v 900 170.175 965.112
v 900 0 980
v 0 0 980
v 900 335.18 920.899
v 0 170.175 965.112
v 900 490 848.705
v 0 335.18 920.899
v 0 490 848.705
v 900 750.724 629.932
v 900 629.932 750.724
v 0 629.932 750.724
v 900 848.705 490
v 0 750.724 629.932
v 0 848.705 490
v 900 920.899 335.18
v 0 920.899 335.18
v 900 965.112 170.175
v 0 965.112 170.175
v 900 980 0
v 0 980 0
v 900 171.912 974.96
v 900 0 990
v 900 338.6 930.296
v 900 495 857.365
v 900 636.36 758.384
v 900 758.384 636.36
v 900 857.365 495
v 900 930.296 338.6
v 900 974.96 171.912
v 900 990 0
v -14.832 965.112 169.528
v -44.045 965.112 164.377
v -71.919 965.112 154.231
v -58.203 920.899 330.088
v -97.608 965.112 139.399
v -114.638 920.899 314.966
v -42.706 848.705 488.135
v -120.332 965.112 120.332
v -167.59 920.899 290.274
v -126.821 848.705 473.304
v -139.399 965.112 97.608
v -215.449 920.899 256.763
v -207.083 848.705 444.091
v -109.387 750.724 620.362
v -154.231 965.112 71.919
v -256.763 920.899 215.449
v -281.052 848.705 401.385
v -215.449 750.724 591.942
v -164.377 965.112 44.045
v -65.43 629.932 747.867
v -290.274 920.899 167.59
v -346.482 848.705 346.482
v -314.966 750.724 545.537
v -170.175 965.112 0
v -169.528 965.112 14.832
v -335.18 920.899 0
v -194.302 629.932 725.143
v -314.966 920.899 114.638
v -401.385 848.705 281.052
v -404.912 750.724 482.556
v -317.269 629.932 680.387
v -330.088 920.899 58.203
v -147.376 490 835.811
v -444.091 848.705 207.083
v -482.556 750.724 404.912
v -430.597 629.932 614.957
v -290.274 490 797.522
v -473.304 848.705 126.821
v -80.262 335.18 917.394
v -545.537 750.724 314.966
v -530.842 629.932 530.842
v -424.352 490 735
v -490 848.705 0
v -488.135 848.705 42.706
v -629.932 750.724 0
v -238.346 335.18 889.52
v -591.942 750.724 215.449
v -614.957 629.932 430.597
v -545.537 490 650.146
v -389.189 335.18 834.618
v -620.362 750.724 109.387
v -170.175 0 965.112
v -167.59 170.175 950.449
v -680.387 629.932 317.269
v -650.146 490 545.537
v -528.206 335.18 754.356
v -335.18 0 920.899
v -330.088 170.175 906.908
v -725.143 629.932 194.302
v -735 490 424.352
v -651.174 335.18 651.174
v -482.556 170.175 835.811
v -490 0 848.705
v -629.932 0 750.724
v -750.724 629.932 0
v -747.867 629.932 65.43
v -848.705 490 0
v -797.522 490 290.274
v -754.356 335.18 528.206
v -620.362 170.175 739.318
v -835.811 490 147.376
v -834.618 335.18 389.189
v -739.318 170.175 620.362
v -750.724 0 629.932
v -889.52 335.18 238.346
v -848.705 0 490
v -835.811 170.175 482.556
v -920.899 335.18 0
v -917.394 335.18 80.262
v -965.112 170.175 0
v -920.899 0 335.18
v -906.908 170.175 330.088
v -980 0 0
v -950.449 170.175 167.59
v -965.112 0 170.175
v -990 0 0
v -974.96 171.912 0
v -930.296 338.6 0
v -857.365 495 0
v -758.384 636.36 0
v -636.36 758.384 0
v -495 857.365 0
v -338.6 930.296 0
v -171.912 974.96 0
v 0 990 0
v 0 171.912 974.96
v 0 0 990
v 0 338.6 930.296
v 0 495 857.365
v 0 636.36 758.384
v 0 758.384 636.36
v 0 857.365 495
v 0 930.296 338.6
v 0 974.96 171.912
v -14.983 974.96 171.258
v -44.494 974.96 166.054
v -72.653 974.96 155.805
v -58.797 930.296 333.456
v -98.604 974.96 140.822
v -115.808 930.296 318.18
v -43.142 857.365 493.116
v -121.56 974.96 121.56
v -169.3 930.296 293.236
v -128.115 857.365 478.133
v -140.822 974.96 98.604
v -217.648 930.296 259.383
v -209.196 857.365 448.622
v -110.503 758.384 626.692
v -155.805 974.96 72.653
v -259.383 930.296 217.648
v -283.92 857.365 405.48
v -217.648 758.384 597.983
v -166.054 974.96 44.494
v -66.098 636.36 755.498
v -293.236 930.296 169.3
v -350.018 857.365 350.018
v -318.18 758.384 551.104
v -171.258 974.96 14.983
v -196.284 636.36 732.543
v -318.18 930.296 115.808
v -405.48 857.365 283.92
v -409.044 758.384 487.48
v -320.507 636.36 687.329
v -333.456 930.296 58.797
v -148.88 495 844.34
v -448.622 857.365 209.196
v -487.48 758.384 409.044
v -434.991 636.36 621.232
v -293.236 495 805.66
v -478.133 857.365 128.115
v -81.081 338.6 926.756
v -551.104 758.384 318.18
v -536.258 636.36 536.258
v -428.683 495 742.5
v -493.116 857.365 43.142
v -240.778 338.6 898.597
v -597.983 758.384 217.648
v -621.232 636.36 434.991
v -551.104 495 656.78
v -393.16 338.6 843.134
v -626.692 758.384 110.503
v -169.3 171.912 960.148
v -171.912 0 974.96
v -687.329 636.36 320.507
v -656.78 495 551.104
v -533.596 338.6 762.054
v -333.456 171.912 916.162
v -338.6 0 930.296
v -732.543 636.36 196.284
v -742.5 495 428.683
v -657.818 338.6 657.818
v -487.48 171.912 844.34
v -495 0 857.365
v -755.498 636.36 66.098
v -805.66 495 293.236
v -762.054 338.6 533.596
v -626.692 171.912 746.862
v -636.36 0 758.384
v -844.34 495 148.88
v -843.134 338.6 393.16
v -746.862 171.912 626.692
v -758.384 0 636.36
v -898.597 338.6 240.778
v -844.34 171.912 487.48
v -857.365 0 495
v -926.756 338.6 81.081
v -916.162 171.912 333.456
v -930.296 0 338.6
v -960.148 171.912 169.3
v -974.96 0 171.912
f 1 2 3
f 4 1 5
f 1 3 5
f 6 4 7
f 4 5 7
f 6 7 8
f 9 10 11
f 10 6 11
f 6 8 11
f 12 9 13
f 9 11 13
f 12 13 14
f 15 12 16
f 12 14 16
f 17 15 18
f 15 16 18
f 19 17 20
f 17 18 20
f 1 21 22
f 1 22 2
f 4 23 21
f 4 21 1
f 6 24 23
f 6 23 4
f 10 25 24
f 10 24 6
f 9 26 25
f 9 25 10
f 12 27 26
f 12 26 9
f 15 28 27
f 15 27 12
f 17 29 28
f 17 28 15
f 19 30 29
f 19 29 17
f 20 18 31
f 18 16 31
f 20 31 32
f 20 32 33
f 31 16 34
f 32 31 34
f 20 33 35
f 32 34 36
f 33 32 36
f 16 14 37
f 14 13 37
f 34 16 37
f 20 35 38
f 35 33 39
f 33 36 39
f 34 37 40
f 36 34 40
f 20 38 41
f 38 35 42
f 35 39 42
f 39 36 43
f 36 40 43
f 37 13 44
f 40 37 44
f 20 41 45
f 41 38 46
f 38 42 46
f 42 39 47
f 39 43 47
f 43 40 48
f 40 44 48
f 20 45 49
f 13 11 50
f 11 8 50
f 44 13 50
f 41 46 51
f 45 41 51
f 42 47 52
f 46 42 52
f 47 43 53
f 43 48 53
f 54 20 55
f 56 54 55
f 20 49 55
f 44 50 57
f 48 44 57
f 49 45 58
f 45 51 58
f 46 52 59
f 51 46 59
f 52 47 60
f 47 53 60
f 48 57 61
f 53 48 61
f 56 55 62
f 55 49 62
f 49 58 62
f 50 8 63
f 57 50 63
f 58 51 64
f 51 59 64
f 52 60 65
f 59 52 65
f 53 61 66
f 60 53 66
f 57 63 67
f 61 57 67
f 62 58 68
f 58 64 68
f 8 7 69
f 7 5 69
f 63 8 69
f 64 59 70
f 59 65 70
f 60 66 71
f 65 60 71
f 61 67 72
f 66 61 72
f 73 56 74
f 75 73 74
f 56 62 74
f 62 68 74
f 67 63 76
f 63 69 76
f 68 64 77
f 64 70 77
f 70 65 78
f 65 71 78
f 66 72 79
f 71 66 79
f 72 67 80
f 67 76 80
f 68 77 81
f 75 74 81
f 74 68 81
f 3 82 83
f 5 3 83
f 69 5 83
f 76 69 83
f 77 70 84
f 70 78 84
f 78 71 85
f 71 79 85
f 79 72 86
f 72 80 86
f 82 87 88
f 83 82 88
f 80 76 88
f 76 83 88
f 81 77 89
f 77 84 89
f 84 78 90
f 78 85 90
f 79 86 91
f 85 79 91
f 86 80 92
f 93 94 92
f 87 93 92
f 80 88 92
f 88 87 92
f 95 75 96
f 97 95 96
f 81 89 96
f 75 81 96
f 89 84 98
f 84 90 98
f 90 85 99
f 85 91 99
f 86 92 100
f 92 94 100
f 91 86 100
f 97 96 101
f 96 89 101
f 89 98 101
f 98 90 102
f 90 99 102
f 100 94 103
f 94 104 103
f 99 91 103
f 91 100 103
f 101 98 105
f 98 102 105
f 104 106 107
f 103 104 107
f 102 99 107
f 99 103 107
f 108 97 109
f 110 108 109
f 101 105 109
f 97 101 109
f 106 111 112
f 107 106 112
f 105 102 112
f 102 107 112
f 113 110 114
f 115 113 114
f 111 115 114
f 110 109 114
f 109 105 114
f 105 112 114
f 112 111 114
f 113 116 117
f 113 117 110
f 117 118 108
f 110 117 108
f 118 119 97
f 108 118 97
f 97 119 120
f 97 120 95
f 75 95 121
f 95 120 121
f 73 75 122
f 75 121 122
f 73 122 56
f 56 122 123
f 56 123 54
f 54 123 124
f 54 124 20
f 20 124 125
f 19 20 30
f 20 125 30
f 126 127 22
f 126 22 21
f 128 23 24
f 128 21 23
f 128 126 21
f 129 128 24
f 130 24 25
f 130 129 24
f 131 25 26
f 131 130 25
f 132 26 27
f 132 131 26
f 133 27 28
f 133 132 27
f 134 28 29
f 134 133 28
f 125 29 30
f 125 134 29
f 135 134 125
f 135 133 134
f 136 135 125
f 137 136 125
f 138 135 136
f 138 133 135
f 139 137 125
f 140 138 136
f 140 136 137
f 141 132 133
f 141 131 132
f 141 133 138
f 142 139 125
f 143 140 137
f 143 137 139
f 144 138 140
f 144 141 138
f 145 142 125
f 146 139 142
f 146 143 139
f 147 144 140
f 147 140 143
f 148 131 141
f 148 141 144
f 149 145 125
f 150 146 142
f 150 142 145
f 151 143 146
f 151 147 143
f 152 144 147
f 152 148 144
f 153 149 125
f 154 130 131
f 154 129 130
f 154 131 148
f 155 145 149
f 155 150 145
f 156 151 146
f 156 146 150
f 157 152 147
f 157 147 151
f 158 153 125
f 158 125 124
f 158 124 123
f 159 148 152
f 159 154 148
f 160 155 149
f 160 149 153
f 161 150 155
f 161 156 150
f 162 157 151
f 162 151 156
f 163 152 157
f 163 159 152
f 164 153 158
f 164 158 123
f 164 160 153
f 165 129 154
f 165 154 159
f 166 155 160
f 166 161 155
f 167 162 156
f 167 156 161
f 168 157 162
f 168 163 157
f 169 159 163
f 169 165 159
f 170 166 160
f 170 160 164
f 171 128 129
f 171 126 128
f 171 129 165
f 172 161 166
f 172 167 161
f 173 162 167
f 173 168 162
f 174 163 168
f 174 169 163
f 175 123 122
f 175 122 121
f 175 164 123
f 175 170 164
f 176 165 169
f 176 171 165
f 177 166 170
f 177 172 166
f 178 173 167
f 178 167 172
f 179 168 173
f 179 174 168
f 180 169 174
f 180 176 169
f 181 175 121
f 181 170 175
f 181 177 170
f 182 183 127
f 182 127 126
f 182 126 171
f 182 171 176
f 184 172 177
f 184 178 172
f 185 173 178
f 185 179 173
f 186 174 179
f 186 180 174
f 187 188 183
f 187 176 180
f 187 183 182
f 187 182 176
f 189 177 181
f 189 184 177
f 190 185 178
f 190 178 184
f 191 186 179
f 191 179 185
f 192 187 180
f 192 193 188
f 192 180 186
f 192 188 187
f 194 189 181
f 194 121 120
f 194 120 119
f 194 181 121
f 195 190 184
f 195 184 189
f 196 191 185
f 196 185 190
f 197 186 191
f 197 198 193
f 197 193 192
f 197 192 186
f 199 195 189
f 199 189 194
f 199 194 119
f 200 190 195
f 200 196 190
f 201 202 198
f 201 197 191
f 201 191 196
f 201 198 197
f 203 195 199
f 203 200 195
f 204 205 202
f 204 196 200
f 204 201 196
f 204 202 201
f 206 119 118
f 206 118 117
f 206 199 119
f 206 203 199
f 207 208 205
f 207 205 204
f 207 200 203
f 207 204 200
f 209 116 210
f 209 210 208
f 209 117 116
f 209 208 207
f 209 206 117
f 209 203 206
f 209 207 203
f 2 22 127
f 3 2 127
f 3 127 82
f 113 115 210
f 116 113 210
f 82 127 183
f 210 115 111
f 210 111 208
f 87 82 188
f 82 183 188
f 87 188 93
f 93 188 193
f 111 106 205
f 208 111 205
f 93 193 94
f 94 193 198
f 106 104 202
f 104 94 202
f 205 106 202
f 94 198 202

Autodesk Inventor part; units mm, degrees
ref_plane "YZ Plane" through (0, 0, 0) normal (1, 0, 0) x (0, 1, 0)
ref_plane "XZ Plane" through (0, 0, 0) normal (0, 1, 0) x (-1, 0, 0)
ref_plane "XY Plane" through (0, 0, 0) normal (0, 0, 1) x (1, 0, 0)
sketch "Sketch1" plane through (0, 0, 0) normal (0, 0, 1) x (1, 0, 0)
  arc A0 (0, 990) -> (-990, 0) centre (0, 0) ccw
  arc A1 (0, 980) -> (-980, 0) centre (0, 0) ccw
  line L0 (-990, 0) -> (-980, 0)
  line L1 (0, 990) -> (0, 980)
  line L2 (0, -214.865) -> (0, 1289.19) projected
  dimension "d0" = 10
  dimension "d1" = 990
  dimension "d2" = 0
  dimension "d3" = 0
revolve "Revolution1" add sketch "Sketch1" angle 90 about axis through (0, -10, 0) along (0, 1, 0)
sketch "Sketch2" plane through (0, 0, 0) normal (1, 0, 0) x (0, -0.7071068, -0.7071068)
  arc A0 (-700.0357, 700.0357) -> (-700.0357, -700.0357) centre (0, 0) ccw projected
  arc A1 (-692.9646, 692.9646) -> (-692.9646, -692.9646) centre (0, 0) ccw projected
  line L0 (-692.9646, 692.9646) -> (-700.0357, 700.0357) projected
  line L1 (-700.0357, -700.0357) -> (-692.9646, -692.9646) projected
extrude "Extrusion2" add sketch "Sketch2" along normal blind 900
equation "\"d0\" = thickness"
equation "\"thickness\" = 10"
equation "\"hoop_angle_z\" = 45deg"
equation "\"hoop_bearing_length\" = 5deg"
equation "\"hoop_cable_diam\" = 5"
equation "\"hoop_cable_pulley_diam\" = 22"
equation "\"rack_tooth_addendum\" = 5"
equation "\"rack_tooth_dedendum\" = 5"
equation "\"rack_tooth_thickness\" = 5"
equation "\"secure_arm_angle\" = 20deg"
equation "\"secure_arm_hold_length\" = 35"
equation "\"secure_arm_radii\" = 9"
equation "\"support_baseClamp_platformLengthBuffer\" = 35"
equation "\"support_baseClamp_platformThickness\" = 15"
equation "\"support_baseClamp_platformWidthBuffer\" = 0"
equation "\"support_baseClamp_sleeveHoleDiameter\" = 12"
equation "\"support_baseClamp_sleeveSweepTerminationAngle\" = 55deg"
equation "\"support_baseClamp_thickness\" = 8"
equation "\"support_frame_endHoleBuffer\" = 25"
equation "\"support_frame_squareBarFillet\" = 2"
equation "\"support_frame_squareBarThickness\" = 5"
equation "\"hoop_tabs_thickness\" = 6"
equation "\"hoop_tabs_hole\" = 4"
equation "\"wheelchair_deployed_width\" = 635"
equation "\"wheelchair_deployed_length\" = 1067"
equation "\"wheelchair_deployed_height\" = 914"
properties part number "cover2_sule_inner"
